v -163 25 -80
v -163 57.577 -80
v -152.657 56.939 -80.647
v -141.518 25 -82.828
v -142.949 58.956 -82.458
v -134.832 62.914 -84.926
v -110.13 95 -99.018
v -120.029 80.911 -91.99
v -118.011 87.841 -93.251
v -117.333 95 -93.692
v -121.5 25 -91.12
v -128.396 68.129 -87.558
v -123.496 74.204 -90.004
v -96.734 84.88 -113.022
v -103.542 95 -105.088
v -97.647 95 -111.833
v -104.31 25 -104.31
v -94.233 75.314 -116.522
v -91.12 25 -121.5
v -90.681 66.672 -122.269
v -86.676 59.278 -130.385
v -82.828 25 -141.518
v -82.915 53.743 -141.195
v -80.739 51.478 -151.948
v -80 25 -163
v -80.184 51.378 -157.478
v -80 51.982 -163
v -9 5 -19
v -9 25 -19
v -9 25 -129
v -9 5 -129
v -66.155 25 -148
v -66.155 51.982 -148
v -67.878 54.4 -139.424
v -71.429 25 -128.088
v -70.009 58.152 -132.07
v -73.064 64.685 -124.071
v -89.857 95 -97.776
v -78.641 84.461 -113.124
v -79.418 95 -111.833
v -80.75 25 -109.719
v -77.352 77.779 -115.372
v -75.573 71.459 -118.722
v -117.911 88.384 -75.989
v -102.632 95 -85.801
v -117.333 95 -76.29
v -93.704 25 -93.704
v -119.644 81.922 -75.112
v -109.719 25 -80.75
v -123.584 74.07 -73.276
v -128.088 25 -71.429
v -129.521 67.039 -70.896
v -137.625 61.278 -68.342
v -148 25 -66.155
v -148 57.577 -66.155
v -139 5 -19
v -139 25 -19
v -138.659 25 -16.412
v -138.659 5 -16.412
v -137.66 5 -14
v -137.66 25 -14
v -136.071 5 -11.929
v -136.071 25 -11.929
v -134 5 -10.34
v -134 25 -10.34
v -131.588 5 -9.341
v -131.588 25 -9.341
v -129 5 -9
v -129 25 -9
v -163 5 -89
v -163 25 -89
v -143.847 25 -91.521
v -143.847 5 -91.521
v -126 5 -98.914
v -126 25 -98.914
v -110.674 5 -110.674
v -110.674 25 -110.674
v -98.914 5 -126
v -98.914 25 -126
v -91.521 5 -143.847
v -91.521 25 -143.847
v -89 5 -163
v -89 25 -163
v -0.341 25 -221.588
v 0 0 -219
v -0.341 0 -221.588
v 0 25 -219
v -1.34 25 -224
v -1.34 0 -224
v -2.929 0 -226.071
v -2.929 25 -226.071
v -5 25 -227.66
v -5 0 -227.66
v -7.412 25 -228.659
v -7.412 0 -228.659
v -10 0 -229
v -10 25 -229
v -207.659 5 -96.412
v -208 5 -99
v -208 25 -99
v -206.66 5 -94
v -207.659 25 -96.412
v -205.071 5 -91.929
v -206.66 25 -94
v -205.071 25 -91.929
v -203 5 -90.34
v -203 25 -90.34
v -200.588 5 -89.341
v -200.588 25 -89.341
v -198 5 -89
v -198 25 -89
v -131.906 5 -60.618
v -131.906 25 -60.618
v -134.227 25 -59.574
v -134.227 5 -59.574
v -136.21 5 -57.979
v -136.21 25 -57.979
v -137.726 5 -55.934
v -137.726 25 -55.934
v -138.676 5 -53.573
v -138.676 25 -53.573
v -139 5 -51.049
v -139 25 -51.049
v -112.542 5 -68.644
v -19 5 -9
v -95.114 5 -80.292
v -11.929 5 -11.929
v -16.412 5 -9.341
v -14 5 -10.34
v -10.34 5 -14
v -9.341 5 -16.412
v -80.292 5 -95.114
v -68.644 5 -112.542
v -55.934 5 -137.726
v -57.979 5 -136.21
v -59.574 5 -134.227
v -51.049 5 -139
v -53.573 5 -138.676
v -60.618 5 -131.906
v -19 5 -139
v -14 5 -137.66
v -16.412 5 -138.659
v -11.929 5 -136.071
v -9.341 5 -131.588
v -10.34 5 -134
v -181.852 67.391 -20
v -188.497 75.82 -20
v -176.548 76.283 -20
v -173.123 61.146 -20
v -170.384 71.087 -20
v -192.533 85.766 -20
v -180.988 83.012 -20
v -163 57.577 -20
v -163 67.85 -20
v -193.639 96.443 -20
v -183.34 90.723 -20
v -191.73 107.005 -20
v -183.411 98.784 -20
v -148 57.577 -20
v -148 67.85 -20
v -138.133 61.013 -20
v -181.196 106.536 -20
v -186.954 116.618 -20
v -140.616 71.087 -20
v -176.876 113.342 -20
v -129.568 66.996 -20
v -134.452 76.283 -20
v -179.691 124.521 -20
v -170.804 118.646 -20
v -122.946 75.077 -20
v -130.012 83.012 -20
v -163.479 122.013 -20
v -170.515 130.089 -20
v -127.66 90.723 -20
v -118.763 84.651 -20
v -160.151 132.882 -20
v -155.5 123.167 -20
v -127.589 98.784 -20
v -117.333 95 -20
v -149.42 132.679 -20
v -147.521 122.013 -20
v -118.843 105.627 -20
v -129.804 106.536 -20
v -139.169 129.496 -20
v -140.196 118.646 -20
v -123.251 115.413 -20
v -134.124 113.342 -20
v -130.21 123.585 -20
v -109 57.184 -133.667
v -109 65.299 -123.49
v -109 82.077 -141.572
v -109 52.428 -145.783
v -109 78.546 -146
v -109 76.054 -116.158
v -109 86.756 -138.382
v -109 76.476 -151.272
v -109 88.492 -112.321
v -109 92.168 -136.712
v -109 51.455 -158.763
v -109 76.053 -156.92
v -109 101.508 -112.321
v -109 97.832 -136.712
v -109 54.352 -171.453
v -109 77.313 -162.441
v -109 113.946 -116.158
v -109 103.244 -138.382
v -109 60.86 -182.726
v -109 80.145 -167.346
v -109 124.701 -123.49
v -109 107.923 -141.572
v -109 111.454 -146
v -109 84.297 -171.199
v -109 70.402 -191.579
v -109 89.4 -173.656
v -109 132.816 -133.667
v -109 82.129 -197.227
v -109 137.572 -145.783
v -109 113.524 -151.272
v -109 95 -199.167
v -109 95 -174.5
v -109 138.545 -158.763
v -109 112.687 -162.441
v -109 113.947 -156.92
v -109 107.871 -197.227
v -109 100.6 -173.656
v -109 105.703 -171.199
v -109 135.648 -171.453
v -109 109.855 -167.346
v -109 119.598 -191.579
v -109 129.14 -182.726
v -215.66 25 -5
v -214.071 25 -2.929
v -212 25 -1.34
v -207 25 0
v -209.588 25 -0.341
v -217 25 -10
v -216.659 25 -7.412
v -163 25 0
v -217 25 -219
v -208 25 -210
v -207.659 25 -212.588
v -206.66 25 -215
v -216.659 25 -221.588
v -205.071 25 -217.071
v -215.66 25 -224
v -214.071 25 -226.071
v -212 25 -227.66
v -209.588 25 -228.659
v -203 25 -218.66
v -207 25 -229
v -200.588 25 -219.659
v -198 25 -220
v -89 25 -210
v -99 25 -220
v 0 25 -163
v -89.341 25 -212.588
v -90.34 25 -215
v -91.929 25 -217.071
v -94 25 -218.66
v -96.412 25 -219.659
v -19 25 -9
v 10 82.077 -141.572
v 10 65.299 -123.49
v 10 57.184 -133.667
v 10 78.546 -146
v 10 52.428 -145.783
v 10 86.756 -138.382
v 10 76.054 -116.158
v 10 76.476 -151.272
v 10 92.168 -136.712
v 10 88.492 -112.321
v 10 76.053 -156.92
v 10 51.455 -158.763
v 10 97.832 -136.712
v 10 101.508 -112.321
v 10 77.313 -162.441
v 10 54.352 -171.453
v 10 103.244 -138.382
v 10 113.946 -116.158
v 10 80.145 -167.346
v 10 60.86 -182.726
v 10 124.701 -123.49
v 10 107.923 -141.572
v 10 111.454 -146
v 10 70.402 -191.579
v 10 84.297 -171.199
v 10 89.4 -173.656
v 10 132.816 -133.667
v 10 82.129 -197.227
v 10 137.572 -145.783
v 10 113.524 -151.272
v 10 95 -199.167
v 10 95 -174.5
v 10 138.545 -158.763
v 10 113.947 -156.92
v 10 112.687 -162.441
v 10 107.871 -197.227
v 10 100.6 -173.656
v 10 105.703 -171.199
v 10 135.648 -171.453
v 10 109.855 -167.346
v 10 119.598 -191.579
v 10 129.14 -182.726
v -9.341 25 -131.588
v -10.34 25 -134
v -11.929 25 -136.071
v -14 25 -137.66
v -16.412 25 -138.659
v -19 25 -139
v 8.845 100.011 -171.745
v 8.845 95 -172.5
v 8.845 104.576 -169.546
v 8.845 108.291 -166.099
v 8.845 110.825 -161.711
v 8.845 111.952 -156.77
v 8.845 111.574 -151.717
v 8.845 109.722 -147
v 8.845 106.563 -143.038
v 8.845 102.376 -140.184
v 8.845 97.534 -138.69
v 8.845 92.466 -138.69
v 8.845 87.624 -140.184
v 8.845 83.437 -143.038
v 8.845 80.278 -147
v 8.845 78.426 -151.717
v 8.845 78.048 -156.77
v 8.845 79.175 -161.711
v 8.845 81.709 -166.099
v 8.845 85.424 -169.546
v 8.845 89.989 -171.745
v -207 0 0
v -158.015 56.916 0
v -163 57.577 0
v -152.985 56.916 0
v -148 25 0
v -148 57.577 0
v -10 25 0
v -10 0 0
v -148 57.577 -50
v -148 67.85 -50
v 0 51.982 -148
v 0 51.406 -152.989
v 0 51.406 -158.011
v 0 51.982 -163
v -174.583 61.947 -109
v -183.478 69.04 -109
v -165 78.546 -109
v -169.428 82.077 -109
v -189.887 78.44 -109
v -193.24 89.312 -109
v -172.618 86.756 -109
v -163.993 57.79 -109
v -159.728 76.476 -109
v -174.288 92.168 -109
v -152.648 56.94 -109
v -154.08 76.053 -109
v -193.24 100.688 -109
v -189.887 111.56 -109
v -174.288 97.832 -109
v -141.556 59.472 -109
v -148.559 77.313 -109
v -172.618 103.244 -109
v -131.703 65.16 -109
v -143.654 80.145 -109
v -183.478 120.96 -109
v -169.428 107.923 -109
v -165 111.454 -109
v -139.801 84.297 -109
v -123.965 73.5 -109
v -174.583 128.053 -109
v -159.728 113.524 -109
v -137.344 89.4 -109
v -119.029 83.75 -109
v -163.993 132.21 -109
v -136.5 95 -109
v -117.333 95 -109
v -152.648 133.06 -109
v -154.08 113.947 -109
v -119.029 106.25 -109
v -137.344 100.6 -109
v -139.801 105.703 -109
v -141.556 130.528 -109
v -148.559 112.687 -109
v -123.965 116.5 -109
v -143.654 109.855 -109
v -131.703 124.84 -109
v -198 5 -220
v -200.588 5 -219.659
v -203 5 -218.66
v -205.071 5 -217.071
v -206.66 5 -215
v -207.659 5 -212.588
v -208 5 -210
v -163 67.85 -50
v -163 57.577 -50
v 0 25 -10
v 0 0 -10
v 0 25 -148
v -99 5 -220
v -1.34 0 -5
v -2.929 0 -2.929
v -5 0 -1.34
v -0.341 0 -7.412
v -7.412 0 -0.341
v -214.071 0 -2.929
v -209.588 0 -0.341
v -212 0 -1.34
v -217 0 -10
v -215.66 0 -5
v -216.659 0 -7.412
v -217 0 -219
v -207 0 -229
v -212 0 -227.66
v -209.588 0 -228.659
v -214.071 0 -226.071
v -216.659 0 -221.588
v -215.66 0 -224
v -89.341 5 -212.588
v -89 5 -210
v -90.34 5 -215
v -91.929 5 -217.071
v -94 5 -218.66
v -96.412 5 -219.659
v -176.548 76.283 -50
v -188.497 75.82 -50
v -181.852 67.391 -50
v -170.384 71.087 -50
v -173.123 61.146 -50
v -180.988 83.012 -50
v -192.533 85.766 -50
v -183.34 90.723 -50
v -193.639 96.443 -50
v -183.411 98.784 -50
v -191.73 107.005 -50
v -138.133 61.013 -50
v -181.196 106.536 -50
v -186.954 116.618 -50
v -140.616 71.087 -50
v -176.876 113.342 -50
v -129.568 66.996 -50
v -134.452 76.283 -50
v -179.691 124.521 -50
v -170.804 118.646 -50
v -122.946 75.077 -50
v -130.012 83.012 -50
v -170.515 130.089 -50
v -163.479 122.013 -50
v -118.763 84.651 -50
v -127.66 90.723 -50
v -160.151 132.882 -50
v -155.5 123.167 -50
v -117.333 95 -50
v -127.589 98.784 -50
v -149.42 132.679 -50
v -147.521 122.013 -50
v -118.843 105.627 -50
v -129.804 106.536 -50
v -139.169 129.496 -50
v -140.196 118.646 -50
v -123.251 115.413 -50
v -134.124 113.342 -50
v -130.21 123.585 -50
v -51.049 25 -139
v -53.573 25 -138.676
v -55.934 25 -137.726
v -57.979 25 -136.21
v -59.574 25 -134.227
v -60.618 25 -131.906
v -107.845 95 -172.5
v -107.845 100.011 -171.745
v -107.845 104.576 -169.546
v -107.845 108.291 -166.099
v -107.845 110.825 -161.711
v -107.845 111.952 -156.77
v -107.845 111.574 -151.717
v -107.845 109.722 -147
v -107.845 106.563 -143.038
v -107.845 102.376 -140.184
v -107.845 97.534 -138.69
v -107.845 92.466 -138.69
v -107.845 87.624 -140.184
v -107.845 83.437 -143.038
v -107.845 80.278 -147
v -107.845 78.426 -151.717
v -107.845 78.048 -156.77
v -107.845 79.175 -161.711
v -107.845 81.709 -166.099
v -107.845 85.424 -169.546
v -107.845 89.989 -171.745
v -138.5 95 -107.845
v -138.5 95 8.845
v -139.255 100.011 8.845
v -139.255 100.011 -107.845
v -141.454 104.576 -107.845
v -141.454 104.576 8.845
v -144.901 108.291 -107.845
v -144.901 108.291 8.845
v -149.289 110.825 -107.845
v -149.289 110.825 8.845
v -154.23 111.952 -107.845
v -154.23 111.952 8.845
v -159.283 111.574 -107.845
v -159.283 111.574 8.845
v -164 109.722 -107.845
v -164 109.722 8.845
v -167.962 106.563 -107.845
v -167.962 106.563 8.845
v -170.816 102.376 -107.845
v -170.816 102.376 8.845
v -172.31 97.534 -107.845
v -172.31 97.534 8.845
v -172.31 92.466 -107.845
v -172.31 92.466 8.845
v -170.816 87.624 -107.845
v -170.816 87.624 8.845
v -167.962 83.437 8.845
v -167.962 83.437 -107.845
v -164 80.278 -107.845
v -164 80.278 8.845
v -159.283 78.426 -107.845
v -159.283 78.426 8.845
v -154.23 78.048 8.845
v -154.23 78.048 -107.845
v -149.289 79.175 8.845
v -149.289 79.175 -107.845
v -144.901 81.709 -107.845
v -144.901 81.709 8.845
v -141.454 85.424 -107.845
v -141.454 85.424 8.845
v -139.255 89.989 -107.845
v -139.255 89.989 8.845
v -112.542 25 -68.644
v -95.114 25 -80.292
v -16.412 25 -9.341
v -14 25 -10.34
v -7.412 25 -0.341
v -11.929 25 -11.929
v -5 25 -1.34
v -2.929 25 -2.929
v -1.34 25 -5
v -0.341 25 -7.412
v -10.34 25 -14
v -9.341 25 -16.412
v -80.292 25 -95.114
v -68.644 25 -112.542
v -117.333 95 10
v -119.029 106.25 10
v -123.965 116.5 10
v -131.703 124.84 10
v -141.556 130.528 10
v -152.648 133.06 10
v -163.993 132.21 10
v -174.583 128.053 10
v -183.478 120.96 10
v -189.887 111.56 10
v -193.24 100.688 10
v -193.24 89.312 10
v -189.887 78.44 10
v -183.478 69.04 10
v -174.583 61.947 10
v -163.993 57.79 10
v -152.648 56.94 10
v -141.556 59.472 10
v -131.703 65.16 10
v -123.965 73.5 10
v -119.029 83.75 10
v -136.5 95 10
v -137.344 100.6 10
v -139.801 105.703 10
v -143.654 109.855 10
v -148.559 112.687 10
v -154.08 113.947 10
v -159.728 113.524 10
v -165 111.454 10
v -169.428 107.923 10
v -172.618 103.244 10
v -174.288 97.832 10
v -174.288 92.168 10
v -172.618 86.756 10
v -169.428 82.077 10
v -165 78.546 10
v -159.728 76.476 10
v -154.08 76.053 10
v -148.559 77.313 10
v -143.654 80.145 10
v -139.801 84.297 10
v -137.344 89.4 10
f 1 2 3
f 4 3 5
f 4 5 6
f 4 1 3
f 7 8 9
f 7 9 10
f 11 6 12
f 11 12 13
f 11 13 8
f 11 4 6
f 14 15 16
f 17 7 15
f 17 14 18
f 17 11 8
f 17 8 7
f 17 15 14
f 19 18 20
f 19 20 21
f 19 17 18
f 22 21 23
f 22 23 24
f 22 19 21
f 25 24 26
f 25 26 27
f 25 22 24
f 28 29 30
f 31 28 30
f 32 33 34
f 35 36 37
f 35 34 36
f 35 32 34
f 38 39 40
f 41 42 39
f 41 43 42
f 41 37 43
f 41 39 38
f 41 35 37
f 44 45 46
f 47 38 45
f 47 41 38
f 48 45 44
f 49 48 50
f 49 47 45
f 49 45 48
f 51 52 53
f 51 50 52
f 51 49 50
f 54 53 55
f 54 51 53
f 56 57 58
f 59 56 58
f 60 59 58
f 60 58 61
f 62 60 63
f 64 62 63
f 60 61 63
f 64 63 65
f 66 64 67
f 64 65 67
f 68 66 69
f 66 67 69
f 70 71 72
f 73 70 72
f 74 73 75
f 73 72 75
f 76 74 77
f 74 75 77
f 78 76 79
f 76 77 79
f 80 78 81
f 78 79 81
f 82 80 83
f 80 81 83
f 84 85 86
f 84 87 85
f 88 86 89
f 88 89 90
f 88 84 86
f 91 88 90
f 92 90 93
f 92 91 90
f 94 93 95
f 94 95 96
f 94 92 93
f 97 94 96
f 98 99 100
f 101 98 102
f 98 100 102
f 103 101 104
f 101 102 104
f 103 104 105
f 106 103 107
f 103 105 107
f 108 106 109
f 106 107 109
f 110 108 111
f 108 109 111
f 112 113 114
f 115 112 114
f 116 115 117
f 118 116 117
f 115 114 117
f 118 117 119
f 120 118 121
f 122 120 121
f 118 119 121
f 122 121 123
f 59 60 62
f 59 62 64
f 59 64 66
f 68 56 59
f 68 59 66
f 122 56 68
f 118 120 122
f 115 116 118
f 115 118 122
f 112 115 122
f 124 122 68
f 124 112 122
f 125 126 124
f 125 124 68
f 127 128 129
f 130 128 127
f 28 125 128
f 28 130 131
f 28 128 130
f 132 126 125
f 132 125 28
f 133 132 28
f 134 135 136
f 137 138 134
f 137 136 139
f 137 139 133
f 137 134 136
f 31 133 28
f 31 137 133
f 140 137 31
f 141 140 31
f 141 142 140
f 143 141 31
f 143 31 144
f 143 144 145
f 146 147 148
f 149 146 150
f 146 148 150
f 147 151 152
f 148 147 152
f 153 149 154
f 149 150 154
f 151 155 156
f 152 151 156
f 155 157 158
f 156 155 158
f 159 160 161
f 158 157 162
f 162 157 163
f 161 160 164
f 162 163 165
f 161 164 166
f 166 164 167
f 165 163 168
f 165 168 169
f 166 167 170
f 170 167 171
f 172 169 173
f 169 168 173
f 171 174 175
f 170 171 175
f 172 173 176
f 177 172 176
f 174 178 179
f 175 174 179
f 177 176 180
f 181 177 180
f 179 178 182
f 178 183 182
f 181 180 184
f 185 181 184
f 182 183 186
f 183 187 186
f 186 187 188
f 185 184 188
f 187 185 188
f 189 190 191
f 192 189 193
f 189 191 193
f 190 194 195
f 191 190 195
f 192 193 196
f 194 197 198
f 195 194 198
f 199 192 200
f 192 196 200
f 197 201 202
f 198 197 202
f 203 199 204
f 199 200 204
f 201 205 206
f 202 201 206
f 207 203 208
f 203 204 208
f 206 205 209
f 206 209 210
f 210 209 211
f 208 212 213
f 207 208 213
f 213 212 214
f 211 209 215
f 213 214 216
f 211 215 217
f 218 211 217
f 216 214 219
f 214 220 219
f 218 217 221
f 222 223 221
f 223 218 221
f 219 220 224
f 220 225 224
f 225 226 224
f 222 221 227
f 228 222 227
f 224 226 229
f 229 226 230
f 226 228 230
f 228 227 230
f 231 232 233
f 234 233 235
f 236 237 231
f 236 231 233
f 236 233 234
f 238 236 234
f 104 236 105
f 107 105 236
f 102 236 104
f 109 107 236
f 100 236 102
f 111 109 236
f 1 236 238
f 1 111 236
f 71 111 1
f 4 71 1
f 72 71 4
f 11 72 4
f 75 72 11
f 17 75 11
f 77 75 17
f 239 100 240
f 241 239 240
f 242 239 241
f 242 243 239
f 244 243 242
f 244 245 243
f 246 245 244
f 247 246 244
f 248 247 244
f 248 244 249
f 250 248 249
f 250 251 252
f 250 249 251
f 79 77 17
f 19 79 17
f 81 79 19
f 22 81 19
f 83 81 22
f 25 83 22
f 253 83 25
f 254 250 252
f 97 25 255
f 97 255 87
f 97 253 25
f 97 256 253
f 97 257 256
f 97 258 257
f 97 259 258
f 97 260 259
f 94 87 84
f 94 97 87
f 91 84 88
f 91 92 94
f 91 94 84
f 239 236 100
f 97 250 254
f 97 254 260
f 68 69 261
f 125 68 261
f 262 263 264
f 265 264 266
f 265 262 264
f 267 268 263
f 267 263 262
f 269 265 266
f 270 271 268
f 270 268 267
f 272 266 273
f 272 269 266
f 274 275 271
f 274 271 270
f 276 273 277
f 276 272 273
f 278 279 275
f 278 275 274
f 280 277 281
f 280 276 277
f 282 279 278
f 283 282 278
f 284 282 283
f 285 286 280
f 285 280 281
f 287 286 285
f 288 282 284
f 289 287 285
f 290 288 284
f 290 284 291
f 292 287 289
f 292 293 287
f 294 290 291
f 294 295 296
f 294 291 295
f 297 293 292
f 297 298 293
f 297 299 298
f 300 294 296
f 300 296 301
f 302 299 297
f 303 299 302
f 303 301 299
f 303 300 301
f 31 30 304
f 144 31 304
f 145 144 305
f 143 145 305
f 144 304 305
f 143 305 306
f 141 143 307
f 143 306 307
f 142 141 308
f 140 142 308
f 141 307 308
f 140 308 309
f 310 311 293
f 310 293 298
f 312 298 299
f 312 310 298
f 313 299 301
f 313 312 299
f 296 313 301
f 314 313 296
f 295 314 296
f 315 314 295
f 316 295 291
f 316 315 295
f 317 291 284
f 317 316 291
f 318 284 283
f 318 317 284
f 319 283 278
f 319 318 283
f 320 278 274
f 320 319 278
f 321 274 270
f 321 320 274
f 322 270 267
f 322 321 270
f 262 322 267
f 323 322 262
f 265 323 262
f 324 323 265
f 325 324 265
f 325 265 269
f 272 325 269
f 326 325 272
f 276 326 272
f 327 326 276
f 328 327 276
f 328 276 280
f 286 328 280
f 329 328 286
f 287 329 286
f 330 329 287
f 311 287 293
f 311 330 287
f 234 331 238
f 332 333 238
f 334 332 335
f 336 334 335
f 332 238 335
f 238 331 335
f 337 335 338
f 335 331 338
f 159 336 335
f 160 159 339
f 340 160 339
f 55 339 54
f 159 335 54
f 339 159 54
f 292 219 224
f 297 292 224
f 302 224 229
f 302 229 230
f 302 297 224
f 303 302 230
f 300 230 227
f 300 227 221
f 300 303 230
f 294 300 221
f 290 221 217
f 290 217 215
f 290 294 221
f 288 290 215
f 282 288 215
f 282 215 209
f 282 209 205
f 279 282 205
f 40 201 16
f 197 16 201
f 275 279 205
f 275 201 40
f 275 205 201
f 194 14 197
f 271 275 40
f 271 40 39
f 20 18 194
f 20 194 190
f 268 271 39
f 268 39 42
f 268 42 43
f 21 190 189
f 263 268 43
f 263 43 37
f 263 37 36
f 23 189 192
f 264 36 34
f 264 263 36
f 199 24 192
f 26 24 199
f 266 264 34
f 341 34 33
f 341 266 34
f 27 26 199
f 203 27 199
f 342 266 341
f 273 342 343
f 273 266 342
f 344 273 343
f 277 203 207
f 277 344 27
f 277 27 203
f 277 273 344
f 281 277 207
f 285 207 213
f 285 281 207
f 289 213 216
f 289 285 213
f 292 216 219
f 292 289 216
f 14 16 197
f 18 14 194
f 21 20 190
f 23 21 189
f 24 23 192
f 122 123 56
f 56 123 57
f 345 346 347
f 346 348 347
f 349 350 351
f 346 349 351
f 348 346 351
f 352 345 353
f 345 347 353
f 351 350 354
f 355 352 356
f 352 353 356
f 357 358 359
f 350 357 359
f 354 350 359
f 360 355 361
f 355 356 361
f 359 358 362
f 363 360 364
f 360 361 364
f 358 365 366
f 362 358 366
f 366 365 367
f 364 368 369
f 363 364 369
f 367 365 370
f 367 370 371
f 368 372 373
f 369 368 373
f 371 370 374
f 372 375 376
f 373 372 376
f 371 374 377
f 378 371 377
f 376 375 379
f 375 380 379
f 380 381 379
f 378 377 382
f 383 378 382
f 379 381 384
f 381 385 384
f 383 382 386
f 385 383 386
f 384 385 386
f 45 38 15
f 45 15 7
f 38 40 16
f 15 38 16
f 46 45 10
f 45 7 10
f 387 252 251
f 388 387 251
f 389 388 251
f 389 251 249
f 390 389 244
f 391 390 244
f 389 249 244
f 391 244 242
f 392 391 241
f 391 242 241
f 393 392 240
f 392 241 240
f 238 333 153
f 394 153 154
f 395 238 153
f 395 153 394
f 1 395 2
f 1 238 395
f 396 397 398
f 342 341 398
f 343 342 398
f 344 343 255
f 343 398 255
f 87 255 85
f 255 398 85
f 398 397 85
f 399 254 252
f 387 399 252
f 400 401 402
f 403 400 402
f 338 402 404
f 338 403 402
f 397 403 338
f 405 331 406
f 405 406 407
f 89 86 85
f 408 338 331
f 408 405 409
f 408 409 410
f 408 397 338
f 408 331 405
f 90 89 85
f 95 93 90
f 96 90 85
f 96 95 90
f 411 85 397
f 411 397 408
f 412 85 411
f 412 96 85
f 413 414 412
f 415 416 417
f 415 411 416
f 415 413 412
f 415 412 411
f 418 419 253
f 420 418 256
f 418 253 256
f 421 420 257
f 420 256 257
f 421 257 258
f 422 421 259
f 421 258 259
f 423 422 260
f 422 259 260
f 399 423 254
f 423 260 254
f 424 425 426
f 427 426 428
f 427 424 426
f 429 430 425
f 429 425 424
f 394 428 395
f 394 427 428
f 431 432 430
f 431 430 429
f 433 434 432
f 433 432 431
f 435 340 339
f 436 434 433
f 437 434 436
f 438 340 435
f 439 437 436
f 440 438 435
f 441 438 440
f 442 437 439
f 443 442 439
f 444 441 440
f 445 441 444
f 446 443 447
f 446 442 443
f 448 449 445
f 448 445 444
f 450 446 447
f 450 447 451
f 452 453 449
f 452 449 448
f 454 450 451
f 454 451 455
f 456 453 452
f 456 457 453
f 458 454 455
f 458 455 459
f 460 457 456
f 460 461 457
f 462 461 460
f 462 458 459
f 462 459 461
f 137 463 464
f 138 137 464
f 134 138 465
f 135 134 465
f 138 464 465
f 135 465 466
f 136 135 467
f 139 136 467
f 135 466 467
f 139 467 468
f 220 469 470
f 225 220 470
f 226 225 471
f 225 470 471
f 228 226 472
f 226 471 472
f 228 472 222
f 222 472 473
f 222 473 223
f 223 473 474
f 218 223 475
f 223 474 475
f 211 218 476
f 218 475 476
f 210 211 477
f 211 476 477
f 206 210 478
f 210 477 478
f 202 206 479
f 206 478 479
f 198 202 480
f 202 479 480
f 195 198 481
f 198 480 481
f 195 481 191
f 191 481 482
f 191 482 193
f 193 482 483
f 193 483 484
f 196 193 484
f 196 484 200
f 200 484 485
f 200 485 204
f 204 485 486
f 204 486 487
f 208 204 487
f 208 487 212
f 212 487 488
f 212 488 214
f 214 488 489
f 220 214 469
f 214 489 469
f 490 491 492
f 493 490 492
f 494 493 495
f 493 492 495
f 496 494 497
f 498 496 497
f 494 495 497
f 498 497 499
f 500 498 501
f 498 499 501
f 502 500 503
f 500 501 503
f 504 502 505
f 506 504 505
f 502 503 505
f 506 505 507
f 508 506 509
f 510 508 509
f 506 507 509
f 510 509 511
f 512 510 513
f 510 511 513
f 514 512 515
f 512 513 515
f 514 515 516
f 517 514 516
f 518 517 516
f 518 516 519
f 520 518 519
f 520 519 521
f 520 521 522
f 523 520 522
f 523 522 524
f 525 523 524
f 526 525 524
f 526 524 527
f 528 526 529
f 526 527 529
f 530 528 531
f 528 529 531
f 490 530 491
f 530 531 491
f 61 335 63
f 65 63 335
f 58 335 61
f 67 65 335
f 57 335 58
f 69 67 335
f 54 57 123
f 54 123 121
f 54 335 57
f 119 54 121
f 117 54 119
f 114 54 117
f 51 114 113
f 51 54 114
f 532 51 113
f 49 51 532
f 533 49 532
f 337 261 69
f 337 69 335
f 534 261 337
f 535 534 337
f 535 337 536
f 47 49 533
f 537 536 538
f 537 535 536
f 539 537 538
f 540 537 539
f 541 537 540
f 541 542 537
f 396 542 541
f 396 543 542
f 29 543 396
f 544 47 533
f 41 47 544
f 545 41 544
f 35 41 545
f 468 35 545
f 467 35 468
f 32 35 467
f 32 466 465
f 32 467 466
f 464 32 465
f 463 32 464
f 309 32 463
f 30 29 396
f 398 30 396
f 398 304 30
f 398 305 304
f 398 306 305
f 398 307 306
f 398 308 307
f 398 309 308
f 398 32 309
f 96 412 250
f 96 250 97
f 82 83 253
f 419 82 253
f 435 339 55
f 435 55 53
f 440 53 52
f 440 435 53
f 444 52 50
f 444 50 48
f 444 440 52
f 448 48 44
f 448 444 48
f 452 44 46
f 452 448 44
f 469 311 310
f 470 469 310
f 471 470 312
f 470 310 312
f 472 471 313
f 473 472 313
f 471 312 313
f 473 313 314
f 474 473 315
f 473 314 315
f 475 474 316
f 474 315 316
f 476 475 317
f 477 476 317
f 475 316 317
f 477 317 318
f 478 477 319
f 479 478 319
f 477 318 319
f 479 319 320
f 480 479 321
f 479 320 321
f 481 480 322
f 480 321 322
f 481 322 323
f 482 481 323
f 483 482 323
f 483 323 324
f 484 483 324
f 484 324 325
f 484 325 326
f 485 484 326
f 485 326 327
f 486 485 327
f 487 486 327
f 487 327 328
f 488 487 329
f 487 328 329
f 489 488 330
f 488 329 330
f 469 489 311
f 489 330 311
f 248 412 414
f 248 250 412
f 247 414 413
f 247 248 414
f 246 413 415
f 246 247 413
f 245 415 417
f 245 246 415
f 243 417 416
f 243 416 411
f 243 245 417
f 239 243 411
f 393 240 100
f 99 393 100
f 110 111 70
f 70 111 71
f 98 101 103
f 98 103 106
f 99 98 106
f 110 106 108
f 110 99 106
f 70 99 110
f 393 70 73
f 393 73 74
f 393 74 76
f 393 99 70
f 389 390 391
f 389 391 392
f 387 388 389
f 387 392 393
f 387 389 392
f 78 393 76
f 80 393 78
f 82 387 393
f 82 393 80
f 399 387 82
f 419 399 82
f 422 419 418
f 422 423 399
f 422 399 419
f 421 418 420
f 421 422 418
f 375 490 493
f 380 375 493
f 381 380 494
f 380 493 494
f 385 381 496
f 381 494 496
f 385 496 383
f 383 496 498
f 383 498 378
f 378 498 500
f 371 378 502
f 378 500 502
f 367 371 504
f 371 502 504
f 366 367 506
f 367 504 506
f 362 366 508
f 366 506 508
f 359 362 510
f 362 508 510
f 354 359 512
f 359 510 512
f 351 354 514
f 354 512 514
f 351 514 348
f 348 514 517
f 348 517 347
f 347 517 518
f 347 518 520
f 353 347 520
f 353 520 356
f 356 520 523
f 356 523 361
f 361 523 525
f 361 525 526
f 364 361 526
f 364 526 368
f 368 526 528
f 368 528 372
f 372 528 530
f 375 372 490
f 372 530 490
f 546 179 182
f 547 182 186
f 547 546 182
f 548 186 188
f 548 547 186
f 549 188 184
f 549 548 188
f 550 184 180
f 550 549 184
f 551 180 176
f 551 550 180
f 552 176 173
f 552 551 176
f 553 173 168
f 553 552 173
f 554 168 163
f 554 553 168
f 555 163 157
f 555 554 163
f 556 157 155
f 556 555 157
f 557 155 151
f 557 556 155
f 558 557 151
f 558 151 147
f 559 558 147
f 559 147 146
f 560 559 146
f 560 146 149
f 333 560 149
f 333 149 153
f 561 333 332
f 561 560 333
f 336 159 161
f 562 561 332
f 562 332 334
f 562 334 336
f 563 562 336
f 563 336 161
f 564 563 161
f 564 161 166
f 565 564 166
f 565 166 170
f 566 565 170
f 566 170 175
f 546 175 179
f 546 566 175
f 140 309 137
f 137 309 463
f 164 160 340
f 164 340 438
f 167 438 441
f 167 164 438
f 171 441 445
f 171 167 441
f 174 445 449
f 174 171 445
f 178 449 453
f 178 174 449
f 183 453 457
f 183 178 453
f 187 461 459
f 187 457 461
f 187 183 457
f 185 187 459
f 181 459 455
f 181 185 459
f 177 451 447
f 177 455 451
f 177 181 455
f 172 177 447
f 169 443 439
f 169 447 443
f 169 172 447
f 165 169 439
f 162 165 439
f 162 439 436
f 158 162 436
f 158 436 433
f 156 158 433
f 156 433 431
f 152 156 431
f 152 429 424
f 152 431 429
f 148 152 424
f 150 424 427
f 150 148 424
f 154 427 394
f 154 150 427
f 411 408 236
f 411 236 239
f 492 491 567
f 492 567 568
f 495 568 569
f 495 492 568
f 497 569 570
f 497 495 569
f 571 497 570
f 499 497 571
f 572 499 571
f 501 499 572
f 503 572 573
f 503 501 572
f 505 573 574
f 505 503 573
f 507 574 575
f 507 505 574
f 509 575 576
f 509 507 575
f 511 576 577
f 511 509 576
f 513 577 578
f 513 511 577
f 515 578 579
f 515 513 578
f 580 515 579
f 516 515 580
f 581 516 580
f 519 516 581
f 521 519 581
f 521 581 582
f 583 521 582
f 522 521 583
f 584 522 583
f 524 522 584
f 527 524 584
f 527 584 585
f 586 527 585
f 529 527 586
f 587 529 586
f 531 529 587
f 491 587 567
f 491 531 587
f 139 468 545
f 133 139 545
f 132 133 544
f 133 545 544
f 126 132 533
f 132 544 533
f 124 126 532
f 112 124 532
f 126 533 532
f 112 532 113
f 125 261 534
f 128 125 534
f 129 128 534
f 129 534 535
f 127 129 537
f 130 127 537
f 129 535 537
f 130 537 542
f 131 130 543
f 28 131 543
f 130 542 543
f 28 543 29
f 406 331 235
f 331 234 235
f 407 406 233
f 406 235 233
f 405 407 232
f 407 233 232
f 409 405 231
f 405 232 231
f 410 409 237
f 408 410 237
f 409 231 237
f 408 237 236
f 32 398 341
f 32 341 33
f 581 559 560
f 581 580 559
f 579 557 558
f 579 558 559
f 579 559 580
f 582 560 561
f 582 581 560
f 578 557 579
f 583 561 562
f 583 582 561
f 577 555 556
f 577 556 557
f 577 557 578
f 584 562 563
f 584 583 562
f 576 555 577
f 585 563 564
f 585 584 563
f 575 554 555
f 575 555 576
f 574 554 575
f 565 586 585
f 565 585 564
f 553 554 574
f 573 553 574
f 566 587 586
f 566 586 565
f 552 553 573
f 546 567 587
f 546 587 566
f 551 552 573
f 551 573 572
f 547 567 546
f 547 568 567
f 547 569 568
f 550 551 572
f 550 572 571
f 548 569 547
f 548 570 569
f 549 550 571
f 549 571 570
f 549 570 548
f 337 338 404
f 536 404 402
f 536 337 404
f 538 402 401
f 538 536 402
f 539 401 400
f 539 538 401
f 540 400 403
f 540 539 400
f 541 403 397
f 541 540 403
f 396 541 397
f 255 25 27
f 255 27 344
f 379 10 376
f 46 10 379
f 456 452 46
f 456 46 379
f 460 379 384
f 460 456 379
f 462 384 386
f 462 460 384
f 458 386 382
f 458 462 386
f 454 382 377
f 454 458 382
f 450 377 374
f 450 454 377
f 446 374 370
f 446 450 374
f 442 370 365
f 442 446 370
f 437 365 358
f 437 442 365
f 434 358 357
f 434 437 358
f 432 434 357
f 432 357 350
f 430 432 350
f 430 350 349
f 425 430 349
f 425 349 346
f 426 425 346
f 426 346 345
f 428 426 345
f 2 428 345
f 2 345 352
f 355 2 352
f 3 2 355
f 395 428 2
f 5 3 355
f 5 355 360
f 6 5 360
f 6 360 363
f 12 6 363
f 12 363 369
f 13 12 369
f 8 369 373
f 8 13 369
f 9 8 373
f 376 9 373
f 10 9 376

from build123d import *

# Parameters (mm, degrees)
SKETCH1_W             = 217
SKETCH1_H             = 229
BOSS_EXTRUDE1_DEPTH   = 25
EXTRUDE_THIN1_START   = -25
EXTRUDE_THIN1_DEPTH   = 95
FILLET1_R             = 10
CUT_EXTRUDE1_DEPTH    = 20
BOSS_EXTRUDE3_START   = 10
SKETCH10_R            = 38.166666667
BOSS_EXTRUDE3_DEPTH   = 119
SKETCH11_R            = 17
CUT_EXTRUDE2_DEPTH    = 119
BOSS_EXTRUDE4_START   = 10
SKETCH12_R            = 43.666666667
BOSS_EXTRUDE4_DEPTH   = 119
SKETCH13_R            = 17
CUT_EXTRUDE3_DEPTH    = 119
CHAMFER1_SIZE         = 2
CHAMFER1_SIZE2        = 1.154700538
CHAMFER1_PART_2_SIZE  = 2
CHAMFER1_PART_2_SIZE2 = 1.154700538
CHAMFER1_PART_3_SIZE  = 2
CHAMFER1_PART_3_SIZE2 = 1.154700538
CHAMFER1_PART_4_SIZE  = 2
CHAMFER1_PART_4_SIZE2 = 1.154700538
CUT_EXTRUDE4_DEPTH    = 20
CUT_EXTRUDE5_START    = -30
SKETCH16_R            = 38.166666667
SKETCH16_R_2          = 28.166666667
CUT_EXTRUDE5_DEPTH    = 30
BOSS_EXTRUDE5_REACH   = 115.667
SKETCH17_W            = 15
SKETCH17_H            = 30


with BuildPart() as part:
    # Sketch1 → Boss-Extrude1 (new body)
    with BuildSketch(Plane(origin=(0, 0, 0), x_dir=(1, 0, 0), z_dir=(0, 1, 0))):
        with Locations((-108.5, 114.5)):
            Rectangle(SKETCH1_W, SKETCH1_H)
    extrude(amount=BOSS_EXTRUDE1_DEPTH)

    # Sketch2 → Extrude-Thin1 (add)
    with BuildSketch(Plane(origin=(0, 25, 0), x_dir=(1, 0, 0), z_dir=(0, 1, 0)).offset(EXTRUDE_THIN1_START)):
        with BuildLine():
            Line((-163, 0), (-163, 80))
            ThreePointArc((-163, 80), (-104.310137162, 104.310137162), (-80, 163))
            Line((-80, 163), (0, 163))
            Line((0, 163), (0, 148))
            Line((0, 148), (-66.154762636, 148))
            ThreePointArc((-66.154762636, 148), (-93.703535444, 93.703535444), (-148, 66.154762636))
            Line((-148, 66.154762636), (-148, 0))
            Line((-148, 0), (-163, 0))
        make_face()
    extrude(amount=EXTRUDE_THIN1_DEPTH)

    # Fillet1
    fillet1_edges = [part.edges().sort_by_distance(p)[0] for p in [
        (0, 12.5, 0),
        (-217, 12.5, 0),
        (-217, 12.5, -229),
        (0, 12.5, -229),
    ]]
    fillet(fillet1_edges, radius=FILLET1_R)

    # Sketch9 → Cut-Extrude1 (cut)
    with BuildSketch(Plane(origin=(0, 25, 0), x_dir=(1, 0, 0), z_dir=(0, 1, 0))):
        with BuildLine():
            Line((-129, 9), (-19, 9))
            ThreePointArc((-19, 9), (-11.928932188, 11.928932188), (-9, 19))
            Line((-9, 19), (-9, 129))
            ThreePointArc((-9, 129), (-11.928932188, 136.071067812), (-19, 139))
            Line((-19, 139), (-51.049117913, 139))
            ThreePointArc((-51.049117913, 139), (-57.004794657, 137.033051383), (-60.617569374, 131.905982906))
            ThreePointArc((-60.617569374, 131.905982906), (-87.339574413, 87.339574413), (-131.905982906, 60.617569374))
            ThreePointArc((-131.905982906, 60.617569374), (-137.033051383, 57.004794657), (-139, 51.049117913))
            Line((-139, 51.049117913), (-139, 19))
            ThreePointArc((-139, 19), (-136.071067812, 11.928932188), (-129, 9))
        make_face()
    extrude(amount=-CUT_EXTRUDE1_DEPTH, mode=Mode.SUBTRACT)

    # Sketch10 → Boss-Extrude3 (add)
    with BuildSketch(Plane.XY.offset(BOSS_EXTRUDE3_START)):
        with Locations((-155.5, 95)):
            Circle(SKETCH10_R)
    extrude(amount=-BOSS_EXTRUDE3_DEPTH)

    # Sketch11 → Cut-Extrude2 (cut)
    with BuildSketch(Plane.XY.offset(10)):
        with Locations((-155.5, 95)):
            Circle(SKETCH11_R)
    extrude(amount=-CUT_EXTRUDE2_DEPTH, mode=Mode.SUBTRACT)

    # Sketch12 → Boss-Extrude4 (add)
    with BuildSketch(Plane(origin=(0, 0, 0), x_dir=(0, 0, -1), z_dir=(1, 0, 0)).offset(BOSS_EXTRUDE4_START)):
        with Locations((155.5, 95)):
            Circle(SKETCH12_R)
    extrude(amount=-BOSS_EXTRUDE4_DEPTH)

    # Sketch13 → Cut-Extrude3 (cut)
    with BuildSketch(Plane(origin=(10, 0, 0), x_dir=(0, 0, -1), z_dir=(1, 0, 0))):
        with Locations((155.5, 95)):
            Circle(SKETCH13_R)
    extrude(amount=-CUT_EXTRUDE3_DEPTH, mode=Mode.SUBTRACT)

    # Chamfer1
    chamfer1_edges = [part.edges().sort_by_distance(p)[0] for p in [
        (-172.5, 95, 10),
    ]]
    chamfer1_side = [part.faces().sort_by_distance(p)[0] for p in [
        (-192.587150314, 95, 10),
    ]]
    chamfer(chamfer1_edges, length=CHAMFER1_SIZE, length2=CHAMFER1_SIZE2, reference=chamfer1_side[0])

    # Chamfer1 part 2
    chamfer1_part_2_edges = [part.edges().sort_by_distance(p)[0] for p in [
        (-172.5, 95, -109),
    ]]
    chamfer1_part_2_side = [part.faces().sort_by_distance(p)[0] for p in [
        (-192.587150314, 95, -109),
    ]]
    chamfer(chamfer1_part_2_edges, length=CHAMFER1_PART_2_SIZE, length2=CHAMFER1_PART_2_SIZE2, reference=chamfer1_part_2_side[0])

    # Chamfer1 part 3
    chamfer1_part_3_edges = [part.edges().sort_by_distance(p)[0] for p in [
        (10, 95, -138.5),
    ]]
    chamfer1_part_3_side = [part.faces().sort_by_distance(p)[0] for p in [
        (10, 95, -113.068413178),
    ]]
    chamfer(chamfer1_part_3_edges, length=CHAMFER1_PART_3_SIZE, length2=CHAMFER1_PART_3_SIZE2, reference=chamfer1_part_3_side[0])

    # Chamfer1 part 4
    chamfer1_part_4_edges = [part.edges().sort_by_distance(p)[0] for p in [
        (-109, 95, -138.5),
    ]]
    chamfer1_part_4_side = [part.faces().sort_by_distance(p)[0] for p in [
        (-109, 95, -113.068413178),
    ]]
    chamfer(chamfer1_part_4_edges, length=CHAMFER1_PART_4_SIZE, length2=CHAMFER1_PART_4_SIZE2, reference=chamfer1_part_4_side[0])

    # Sketch15 → Cut-Extrude4 (cut)
    with BuildSketch(Plane(origin=(0, 25, 0), x_dir=(1, 0, 0), z_dir=(0, 1, 0))):
        with BuildLine():
            Line((-89, 163), (-89, 210))
            ThreePointArc((-89, 210), (-91.928932188, 217.071067812), (-99, 220))
            Line((-99, 220), (-198, 220))
            ThreePointArc((-198, 220), (-205.071067812, 217.071067812), (-208, 210))
            Line((-208, 210), (-208, 99))
            ThreePointArc((-208, 99), (-205.071067812, 91.928932188), (-198, 89))
            Line((-198, 89), (-163, 89))
            ThreePointArc((-163, 89), (-110.674098192, 110.674098192), (-89, 163))
        make_face()
    extrude(amount=-CUT_EXTRUDE4_DEPTH, mode=Mode.SUBTRACT)

    # Sketch16 → Cut-Extrude5 (cut)
    with BuildSketch(Plane.XY.offset(10).offset(CUT_EXTRUDE5_START)):
        with Locations((-155.5, 95)):
            Circle(SKETCH16_R)
        with Locations((-155.5, 95)):
            Circle(SKETCH16_R_2, mode=Mode.SUBTRACT)
    extrude(amount=-CUT_EXTRUDE5_DEPTH, mode=Mode.SUBTRACT)

    # Sketch17 → Boss-Extrude5 (add, up to next)
    with BuildSketch(Plane(origin=(0, 25, 0), x_dir=(1, 0, 0), z_dir=(0, 1, 0)), mode=Mode.PRIVATE) as boss_extrude5_sk1:
        with Locations((-155.5, 35)):
            Rectangle(SKETCH17_W, SKETCH17_H)
    boss_extrude5_tool1 = extrude(boss_extrude5_sk1.sketch, amount=BOSS_EXTRUDE5_REACH, mode=Mode.PRIVATE) - part.part
    add(boss_extrude5_tool1.solids().sort_by_distance((-155.5, 25, -35))[0])


solid = part.part
